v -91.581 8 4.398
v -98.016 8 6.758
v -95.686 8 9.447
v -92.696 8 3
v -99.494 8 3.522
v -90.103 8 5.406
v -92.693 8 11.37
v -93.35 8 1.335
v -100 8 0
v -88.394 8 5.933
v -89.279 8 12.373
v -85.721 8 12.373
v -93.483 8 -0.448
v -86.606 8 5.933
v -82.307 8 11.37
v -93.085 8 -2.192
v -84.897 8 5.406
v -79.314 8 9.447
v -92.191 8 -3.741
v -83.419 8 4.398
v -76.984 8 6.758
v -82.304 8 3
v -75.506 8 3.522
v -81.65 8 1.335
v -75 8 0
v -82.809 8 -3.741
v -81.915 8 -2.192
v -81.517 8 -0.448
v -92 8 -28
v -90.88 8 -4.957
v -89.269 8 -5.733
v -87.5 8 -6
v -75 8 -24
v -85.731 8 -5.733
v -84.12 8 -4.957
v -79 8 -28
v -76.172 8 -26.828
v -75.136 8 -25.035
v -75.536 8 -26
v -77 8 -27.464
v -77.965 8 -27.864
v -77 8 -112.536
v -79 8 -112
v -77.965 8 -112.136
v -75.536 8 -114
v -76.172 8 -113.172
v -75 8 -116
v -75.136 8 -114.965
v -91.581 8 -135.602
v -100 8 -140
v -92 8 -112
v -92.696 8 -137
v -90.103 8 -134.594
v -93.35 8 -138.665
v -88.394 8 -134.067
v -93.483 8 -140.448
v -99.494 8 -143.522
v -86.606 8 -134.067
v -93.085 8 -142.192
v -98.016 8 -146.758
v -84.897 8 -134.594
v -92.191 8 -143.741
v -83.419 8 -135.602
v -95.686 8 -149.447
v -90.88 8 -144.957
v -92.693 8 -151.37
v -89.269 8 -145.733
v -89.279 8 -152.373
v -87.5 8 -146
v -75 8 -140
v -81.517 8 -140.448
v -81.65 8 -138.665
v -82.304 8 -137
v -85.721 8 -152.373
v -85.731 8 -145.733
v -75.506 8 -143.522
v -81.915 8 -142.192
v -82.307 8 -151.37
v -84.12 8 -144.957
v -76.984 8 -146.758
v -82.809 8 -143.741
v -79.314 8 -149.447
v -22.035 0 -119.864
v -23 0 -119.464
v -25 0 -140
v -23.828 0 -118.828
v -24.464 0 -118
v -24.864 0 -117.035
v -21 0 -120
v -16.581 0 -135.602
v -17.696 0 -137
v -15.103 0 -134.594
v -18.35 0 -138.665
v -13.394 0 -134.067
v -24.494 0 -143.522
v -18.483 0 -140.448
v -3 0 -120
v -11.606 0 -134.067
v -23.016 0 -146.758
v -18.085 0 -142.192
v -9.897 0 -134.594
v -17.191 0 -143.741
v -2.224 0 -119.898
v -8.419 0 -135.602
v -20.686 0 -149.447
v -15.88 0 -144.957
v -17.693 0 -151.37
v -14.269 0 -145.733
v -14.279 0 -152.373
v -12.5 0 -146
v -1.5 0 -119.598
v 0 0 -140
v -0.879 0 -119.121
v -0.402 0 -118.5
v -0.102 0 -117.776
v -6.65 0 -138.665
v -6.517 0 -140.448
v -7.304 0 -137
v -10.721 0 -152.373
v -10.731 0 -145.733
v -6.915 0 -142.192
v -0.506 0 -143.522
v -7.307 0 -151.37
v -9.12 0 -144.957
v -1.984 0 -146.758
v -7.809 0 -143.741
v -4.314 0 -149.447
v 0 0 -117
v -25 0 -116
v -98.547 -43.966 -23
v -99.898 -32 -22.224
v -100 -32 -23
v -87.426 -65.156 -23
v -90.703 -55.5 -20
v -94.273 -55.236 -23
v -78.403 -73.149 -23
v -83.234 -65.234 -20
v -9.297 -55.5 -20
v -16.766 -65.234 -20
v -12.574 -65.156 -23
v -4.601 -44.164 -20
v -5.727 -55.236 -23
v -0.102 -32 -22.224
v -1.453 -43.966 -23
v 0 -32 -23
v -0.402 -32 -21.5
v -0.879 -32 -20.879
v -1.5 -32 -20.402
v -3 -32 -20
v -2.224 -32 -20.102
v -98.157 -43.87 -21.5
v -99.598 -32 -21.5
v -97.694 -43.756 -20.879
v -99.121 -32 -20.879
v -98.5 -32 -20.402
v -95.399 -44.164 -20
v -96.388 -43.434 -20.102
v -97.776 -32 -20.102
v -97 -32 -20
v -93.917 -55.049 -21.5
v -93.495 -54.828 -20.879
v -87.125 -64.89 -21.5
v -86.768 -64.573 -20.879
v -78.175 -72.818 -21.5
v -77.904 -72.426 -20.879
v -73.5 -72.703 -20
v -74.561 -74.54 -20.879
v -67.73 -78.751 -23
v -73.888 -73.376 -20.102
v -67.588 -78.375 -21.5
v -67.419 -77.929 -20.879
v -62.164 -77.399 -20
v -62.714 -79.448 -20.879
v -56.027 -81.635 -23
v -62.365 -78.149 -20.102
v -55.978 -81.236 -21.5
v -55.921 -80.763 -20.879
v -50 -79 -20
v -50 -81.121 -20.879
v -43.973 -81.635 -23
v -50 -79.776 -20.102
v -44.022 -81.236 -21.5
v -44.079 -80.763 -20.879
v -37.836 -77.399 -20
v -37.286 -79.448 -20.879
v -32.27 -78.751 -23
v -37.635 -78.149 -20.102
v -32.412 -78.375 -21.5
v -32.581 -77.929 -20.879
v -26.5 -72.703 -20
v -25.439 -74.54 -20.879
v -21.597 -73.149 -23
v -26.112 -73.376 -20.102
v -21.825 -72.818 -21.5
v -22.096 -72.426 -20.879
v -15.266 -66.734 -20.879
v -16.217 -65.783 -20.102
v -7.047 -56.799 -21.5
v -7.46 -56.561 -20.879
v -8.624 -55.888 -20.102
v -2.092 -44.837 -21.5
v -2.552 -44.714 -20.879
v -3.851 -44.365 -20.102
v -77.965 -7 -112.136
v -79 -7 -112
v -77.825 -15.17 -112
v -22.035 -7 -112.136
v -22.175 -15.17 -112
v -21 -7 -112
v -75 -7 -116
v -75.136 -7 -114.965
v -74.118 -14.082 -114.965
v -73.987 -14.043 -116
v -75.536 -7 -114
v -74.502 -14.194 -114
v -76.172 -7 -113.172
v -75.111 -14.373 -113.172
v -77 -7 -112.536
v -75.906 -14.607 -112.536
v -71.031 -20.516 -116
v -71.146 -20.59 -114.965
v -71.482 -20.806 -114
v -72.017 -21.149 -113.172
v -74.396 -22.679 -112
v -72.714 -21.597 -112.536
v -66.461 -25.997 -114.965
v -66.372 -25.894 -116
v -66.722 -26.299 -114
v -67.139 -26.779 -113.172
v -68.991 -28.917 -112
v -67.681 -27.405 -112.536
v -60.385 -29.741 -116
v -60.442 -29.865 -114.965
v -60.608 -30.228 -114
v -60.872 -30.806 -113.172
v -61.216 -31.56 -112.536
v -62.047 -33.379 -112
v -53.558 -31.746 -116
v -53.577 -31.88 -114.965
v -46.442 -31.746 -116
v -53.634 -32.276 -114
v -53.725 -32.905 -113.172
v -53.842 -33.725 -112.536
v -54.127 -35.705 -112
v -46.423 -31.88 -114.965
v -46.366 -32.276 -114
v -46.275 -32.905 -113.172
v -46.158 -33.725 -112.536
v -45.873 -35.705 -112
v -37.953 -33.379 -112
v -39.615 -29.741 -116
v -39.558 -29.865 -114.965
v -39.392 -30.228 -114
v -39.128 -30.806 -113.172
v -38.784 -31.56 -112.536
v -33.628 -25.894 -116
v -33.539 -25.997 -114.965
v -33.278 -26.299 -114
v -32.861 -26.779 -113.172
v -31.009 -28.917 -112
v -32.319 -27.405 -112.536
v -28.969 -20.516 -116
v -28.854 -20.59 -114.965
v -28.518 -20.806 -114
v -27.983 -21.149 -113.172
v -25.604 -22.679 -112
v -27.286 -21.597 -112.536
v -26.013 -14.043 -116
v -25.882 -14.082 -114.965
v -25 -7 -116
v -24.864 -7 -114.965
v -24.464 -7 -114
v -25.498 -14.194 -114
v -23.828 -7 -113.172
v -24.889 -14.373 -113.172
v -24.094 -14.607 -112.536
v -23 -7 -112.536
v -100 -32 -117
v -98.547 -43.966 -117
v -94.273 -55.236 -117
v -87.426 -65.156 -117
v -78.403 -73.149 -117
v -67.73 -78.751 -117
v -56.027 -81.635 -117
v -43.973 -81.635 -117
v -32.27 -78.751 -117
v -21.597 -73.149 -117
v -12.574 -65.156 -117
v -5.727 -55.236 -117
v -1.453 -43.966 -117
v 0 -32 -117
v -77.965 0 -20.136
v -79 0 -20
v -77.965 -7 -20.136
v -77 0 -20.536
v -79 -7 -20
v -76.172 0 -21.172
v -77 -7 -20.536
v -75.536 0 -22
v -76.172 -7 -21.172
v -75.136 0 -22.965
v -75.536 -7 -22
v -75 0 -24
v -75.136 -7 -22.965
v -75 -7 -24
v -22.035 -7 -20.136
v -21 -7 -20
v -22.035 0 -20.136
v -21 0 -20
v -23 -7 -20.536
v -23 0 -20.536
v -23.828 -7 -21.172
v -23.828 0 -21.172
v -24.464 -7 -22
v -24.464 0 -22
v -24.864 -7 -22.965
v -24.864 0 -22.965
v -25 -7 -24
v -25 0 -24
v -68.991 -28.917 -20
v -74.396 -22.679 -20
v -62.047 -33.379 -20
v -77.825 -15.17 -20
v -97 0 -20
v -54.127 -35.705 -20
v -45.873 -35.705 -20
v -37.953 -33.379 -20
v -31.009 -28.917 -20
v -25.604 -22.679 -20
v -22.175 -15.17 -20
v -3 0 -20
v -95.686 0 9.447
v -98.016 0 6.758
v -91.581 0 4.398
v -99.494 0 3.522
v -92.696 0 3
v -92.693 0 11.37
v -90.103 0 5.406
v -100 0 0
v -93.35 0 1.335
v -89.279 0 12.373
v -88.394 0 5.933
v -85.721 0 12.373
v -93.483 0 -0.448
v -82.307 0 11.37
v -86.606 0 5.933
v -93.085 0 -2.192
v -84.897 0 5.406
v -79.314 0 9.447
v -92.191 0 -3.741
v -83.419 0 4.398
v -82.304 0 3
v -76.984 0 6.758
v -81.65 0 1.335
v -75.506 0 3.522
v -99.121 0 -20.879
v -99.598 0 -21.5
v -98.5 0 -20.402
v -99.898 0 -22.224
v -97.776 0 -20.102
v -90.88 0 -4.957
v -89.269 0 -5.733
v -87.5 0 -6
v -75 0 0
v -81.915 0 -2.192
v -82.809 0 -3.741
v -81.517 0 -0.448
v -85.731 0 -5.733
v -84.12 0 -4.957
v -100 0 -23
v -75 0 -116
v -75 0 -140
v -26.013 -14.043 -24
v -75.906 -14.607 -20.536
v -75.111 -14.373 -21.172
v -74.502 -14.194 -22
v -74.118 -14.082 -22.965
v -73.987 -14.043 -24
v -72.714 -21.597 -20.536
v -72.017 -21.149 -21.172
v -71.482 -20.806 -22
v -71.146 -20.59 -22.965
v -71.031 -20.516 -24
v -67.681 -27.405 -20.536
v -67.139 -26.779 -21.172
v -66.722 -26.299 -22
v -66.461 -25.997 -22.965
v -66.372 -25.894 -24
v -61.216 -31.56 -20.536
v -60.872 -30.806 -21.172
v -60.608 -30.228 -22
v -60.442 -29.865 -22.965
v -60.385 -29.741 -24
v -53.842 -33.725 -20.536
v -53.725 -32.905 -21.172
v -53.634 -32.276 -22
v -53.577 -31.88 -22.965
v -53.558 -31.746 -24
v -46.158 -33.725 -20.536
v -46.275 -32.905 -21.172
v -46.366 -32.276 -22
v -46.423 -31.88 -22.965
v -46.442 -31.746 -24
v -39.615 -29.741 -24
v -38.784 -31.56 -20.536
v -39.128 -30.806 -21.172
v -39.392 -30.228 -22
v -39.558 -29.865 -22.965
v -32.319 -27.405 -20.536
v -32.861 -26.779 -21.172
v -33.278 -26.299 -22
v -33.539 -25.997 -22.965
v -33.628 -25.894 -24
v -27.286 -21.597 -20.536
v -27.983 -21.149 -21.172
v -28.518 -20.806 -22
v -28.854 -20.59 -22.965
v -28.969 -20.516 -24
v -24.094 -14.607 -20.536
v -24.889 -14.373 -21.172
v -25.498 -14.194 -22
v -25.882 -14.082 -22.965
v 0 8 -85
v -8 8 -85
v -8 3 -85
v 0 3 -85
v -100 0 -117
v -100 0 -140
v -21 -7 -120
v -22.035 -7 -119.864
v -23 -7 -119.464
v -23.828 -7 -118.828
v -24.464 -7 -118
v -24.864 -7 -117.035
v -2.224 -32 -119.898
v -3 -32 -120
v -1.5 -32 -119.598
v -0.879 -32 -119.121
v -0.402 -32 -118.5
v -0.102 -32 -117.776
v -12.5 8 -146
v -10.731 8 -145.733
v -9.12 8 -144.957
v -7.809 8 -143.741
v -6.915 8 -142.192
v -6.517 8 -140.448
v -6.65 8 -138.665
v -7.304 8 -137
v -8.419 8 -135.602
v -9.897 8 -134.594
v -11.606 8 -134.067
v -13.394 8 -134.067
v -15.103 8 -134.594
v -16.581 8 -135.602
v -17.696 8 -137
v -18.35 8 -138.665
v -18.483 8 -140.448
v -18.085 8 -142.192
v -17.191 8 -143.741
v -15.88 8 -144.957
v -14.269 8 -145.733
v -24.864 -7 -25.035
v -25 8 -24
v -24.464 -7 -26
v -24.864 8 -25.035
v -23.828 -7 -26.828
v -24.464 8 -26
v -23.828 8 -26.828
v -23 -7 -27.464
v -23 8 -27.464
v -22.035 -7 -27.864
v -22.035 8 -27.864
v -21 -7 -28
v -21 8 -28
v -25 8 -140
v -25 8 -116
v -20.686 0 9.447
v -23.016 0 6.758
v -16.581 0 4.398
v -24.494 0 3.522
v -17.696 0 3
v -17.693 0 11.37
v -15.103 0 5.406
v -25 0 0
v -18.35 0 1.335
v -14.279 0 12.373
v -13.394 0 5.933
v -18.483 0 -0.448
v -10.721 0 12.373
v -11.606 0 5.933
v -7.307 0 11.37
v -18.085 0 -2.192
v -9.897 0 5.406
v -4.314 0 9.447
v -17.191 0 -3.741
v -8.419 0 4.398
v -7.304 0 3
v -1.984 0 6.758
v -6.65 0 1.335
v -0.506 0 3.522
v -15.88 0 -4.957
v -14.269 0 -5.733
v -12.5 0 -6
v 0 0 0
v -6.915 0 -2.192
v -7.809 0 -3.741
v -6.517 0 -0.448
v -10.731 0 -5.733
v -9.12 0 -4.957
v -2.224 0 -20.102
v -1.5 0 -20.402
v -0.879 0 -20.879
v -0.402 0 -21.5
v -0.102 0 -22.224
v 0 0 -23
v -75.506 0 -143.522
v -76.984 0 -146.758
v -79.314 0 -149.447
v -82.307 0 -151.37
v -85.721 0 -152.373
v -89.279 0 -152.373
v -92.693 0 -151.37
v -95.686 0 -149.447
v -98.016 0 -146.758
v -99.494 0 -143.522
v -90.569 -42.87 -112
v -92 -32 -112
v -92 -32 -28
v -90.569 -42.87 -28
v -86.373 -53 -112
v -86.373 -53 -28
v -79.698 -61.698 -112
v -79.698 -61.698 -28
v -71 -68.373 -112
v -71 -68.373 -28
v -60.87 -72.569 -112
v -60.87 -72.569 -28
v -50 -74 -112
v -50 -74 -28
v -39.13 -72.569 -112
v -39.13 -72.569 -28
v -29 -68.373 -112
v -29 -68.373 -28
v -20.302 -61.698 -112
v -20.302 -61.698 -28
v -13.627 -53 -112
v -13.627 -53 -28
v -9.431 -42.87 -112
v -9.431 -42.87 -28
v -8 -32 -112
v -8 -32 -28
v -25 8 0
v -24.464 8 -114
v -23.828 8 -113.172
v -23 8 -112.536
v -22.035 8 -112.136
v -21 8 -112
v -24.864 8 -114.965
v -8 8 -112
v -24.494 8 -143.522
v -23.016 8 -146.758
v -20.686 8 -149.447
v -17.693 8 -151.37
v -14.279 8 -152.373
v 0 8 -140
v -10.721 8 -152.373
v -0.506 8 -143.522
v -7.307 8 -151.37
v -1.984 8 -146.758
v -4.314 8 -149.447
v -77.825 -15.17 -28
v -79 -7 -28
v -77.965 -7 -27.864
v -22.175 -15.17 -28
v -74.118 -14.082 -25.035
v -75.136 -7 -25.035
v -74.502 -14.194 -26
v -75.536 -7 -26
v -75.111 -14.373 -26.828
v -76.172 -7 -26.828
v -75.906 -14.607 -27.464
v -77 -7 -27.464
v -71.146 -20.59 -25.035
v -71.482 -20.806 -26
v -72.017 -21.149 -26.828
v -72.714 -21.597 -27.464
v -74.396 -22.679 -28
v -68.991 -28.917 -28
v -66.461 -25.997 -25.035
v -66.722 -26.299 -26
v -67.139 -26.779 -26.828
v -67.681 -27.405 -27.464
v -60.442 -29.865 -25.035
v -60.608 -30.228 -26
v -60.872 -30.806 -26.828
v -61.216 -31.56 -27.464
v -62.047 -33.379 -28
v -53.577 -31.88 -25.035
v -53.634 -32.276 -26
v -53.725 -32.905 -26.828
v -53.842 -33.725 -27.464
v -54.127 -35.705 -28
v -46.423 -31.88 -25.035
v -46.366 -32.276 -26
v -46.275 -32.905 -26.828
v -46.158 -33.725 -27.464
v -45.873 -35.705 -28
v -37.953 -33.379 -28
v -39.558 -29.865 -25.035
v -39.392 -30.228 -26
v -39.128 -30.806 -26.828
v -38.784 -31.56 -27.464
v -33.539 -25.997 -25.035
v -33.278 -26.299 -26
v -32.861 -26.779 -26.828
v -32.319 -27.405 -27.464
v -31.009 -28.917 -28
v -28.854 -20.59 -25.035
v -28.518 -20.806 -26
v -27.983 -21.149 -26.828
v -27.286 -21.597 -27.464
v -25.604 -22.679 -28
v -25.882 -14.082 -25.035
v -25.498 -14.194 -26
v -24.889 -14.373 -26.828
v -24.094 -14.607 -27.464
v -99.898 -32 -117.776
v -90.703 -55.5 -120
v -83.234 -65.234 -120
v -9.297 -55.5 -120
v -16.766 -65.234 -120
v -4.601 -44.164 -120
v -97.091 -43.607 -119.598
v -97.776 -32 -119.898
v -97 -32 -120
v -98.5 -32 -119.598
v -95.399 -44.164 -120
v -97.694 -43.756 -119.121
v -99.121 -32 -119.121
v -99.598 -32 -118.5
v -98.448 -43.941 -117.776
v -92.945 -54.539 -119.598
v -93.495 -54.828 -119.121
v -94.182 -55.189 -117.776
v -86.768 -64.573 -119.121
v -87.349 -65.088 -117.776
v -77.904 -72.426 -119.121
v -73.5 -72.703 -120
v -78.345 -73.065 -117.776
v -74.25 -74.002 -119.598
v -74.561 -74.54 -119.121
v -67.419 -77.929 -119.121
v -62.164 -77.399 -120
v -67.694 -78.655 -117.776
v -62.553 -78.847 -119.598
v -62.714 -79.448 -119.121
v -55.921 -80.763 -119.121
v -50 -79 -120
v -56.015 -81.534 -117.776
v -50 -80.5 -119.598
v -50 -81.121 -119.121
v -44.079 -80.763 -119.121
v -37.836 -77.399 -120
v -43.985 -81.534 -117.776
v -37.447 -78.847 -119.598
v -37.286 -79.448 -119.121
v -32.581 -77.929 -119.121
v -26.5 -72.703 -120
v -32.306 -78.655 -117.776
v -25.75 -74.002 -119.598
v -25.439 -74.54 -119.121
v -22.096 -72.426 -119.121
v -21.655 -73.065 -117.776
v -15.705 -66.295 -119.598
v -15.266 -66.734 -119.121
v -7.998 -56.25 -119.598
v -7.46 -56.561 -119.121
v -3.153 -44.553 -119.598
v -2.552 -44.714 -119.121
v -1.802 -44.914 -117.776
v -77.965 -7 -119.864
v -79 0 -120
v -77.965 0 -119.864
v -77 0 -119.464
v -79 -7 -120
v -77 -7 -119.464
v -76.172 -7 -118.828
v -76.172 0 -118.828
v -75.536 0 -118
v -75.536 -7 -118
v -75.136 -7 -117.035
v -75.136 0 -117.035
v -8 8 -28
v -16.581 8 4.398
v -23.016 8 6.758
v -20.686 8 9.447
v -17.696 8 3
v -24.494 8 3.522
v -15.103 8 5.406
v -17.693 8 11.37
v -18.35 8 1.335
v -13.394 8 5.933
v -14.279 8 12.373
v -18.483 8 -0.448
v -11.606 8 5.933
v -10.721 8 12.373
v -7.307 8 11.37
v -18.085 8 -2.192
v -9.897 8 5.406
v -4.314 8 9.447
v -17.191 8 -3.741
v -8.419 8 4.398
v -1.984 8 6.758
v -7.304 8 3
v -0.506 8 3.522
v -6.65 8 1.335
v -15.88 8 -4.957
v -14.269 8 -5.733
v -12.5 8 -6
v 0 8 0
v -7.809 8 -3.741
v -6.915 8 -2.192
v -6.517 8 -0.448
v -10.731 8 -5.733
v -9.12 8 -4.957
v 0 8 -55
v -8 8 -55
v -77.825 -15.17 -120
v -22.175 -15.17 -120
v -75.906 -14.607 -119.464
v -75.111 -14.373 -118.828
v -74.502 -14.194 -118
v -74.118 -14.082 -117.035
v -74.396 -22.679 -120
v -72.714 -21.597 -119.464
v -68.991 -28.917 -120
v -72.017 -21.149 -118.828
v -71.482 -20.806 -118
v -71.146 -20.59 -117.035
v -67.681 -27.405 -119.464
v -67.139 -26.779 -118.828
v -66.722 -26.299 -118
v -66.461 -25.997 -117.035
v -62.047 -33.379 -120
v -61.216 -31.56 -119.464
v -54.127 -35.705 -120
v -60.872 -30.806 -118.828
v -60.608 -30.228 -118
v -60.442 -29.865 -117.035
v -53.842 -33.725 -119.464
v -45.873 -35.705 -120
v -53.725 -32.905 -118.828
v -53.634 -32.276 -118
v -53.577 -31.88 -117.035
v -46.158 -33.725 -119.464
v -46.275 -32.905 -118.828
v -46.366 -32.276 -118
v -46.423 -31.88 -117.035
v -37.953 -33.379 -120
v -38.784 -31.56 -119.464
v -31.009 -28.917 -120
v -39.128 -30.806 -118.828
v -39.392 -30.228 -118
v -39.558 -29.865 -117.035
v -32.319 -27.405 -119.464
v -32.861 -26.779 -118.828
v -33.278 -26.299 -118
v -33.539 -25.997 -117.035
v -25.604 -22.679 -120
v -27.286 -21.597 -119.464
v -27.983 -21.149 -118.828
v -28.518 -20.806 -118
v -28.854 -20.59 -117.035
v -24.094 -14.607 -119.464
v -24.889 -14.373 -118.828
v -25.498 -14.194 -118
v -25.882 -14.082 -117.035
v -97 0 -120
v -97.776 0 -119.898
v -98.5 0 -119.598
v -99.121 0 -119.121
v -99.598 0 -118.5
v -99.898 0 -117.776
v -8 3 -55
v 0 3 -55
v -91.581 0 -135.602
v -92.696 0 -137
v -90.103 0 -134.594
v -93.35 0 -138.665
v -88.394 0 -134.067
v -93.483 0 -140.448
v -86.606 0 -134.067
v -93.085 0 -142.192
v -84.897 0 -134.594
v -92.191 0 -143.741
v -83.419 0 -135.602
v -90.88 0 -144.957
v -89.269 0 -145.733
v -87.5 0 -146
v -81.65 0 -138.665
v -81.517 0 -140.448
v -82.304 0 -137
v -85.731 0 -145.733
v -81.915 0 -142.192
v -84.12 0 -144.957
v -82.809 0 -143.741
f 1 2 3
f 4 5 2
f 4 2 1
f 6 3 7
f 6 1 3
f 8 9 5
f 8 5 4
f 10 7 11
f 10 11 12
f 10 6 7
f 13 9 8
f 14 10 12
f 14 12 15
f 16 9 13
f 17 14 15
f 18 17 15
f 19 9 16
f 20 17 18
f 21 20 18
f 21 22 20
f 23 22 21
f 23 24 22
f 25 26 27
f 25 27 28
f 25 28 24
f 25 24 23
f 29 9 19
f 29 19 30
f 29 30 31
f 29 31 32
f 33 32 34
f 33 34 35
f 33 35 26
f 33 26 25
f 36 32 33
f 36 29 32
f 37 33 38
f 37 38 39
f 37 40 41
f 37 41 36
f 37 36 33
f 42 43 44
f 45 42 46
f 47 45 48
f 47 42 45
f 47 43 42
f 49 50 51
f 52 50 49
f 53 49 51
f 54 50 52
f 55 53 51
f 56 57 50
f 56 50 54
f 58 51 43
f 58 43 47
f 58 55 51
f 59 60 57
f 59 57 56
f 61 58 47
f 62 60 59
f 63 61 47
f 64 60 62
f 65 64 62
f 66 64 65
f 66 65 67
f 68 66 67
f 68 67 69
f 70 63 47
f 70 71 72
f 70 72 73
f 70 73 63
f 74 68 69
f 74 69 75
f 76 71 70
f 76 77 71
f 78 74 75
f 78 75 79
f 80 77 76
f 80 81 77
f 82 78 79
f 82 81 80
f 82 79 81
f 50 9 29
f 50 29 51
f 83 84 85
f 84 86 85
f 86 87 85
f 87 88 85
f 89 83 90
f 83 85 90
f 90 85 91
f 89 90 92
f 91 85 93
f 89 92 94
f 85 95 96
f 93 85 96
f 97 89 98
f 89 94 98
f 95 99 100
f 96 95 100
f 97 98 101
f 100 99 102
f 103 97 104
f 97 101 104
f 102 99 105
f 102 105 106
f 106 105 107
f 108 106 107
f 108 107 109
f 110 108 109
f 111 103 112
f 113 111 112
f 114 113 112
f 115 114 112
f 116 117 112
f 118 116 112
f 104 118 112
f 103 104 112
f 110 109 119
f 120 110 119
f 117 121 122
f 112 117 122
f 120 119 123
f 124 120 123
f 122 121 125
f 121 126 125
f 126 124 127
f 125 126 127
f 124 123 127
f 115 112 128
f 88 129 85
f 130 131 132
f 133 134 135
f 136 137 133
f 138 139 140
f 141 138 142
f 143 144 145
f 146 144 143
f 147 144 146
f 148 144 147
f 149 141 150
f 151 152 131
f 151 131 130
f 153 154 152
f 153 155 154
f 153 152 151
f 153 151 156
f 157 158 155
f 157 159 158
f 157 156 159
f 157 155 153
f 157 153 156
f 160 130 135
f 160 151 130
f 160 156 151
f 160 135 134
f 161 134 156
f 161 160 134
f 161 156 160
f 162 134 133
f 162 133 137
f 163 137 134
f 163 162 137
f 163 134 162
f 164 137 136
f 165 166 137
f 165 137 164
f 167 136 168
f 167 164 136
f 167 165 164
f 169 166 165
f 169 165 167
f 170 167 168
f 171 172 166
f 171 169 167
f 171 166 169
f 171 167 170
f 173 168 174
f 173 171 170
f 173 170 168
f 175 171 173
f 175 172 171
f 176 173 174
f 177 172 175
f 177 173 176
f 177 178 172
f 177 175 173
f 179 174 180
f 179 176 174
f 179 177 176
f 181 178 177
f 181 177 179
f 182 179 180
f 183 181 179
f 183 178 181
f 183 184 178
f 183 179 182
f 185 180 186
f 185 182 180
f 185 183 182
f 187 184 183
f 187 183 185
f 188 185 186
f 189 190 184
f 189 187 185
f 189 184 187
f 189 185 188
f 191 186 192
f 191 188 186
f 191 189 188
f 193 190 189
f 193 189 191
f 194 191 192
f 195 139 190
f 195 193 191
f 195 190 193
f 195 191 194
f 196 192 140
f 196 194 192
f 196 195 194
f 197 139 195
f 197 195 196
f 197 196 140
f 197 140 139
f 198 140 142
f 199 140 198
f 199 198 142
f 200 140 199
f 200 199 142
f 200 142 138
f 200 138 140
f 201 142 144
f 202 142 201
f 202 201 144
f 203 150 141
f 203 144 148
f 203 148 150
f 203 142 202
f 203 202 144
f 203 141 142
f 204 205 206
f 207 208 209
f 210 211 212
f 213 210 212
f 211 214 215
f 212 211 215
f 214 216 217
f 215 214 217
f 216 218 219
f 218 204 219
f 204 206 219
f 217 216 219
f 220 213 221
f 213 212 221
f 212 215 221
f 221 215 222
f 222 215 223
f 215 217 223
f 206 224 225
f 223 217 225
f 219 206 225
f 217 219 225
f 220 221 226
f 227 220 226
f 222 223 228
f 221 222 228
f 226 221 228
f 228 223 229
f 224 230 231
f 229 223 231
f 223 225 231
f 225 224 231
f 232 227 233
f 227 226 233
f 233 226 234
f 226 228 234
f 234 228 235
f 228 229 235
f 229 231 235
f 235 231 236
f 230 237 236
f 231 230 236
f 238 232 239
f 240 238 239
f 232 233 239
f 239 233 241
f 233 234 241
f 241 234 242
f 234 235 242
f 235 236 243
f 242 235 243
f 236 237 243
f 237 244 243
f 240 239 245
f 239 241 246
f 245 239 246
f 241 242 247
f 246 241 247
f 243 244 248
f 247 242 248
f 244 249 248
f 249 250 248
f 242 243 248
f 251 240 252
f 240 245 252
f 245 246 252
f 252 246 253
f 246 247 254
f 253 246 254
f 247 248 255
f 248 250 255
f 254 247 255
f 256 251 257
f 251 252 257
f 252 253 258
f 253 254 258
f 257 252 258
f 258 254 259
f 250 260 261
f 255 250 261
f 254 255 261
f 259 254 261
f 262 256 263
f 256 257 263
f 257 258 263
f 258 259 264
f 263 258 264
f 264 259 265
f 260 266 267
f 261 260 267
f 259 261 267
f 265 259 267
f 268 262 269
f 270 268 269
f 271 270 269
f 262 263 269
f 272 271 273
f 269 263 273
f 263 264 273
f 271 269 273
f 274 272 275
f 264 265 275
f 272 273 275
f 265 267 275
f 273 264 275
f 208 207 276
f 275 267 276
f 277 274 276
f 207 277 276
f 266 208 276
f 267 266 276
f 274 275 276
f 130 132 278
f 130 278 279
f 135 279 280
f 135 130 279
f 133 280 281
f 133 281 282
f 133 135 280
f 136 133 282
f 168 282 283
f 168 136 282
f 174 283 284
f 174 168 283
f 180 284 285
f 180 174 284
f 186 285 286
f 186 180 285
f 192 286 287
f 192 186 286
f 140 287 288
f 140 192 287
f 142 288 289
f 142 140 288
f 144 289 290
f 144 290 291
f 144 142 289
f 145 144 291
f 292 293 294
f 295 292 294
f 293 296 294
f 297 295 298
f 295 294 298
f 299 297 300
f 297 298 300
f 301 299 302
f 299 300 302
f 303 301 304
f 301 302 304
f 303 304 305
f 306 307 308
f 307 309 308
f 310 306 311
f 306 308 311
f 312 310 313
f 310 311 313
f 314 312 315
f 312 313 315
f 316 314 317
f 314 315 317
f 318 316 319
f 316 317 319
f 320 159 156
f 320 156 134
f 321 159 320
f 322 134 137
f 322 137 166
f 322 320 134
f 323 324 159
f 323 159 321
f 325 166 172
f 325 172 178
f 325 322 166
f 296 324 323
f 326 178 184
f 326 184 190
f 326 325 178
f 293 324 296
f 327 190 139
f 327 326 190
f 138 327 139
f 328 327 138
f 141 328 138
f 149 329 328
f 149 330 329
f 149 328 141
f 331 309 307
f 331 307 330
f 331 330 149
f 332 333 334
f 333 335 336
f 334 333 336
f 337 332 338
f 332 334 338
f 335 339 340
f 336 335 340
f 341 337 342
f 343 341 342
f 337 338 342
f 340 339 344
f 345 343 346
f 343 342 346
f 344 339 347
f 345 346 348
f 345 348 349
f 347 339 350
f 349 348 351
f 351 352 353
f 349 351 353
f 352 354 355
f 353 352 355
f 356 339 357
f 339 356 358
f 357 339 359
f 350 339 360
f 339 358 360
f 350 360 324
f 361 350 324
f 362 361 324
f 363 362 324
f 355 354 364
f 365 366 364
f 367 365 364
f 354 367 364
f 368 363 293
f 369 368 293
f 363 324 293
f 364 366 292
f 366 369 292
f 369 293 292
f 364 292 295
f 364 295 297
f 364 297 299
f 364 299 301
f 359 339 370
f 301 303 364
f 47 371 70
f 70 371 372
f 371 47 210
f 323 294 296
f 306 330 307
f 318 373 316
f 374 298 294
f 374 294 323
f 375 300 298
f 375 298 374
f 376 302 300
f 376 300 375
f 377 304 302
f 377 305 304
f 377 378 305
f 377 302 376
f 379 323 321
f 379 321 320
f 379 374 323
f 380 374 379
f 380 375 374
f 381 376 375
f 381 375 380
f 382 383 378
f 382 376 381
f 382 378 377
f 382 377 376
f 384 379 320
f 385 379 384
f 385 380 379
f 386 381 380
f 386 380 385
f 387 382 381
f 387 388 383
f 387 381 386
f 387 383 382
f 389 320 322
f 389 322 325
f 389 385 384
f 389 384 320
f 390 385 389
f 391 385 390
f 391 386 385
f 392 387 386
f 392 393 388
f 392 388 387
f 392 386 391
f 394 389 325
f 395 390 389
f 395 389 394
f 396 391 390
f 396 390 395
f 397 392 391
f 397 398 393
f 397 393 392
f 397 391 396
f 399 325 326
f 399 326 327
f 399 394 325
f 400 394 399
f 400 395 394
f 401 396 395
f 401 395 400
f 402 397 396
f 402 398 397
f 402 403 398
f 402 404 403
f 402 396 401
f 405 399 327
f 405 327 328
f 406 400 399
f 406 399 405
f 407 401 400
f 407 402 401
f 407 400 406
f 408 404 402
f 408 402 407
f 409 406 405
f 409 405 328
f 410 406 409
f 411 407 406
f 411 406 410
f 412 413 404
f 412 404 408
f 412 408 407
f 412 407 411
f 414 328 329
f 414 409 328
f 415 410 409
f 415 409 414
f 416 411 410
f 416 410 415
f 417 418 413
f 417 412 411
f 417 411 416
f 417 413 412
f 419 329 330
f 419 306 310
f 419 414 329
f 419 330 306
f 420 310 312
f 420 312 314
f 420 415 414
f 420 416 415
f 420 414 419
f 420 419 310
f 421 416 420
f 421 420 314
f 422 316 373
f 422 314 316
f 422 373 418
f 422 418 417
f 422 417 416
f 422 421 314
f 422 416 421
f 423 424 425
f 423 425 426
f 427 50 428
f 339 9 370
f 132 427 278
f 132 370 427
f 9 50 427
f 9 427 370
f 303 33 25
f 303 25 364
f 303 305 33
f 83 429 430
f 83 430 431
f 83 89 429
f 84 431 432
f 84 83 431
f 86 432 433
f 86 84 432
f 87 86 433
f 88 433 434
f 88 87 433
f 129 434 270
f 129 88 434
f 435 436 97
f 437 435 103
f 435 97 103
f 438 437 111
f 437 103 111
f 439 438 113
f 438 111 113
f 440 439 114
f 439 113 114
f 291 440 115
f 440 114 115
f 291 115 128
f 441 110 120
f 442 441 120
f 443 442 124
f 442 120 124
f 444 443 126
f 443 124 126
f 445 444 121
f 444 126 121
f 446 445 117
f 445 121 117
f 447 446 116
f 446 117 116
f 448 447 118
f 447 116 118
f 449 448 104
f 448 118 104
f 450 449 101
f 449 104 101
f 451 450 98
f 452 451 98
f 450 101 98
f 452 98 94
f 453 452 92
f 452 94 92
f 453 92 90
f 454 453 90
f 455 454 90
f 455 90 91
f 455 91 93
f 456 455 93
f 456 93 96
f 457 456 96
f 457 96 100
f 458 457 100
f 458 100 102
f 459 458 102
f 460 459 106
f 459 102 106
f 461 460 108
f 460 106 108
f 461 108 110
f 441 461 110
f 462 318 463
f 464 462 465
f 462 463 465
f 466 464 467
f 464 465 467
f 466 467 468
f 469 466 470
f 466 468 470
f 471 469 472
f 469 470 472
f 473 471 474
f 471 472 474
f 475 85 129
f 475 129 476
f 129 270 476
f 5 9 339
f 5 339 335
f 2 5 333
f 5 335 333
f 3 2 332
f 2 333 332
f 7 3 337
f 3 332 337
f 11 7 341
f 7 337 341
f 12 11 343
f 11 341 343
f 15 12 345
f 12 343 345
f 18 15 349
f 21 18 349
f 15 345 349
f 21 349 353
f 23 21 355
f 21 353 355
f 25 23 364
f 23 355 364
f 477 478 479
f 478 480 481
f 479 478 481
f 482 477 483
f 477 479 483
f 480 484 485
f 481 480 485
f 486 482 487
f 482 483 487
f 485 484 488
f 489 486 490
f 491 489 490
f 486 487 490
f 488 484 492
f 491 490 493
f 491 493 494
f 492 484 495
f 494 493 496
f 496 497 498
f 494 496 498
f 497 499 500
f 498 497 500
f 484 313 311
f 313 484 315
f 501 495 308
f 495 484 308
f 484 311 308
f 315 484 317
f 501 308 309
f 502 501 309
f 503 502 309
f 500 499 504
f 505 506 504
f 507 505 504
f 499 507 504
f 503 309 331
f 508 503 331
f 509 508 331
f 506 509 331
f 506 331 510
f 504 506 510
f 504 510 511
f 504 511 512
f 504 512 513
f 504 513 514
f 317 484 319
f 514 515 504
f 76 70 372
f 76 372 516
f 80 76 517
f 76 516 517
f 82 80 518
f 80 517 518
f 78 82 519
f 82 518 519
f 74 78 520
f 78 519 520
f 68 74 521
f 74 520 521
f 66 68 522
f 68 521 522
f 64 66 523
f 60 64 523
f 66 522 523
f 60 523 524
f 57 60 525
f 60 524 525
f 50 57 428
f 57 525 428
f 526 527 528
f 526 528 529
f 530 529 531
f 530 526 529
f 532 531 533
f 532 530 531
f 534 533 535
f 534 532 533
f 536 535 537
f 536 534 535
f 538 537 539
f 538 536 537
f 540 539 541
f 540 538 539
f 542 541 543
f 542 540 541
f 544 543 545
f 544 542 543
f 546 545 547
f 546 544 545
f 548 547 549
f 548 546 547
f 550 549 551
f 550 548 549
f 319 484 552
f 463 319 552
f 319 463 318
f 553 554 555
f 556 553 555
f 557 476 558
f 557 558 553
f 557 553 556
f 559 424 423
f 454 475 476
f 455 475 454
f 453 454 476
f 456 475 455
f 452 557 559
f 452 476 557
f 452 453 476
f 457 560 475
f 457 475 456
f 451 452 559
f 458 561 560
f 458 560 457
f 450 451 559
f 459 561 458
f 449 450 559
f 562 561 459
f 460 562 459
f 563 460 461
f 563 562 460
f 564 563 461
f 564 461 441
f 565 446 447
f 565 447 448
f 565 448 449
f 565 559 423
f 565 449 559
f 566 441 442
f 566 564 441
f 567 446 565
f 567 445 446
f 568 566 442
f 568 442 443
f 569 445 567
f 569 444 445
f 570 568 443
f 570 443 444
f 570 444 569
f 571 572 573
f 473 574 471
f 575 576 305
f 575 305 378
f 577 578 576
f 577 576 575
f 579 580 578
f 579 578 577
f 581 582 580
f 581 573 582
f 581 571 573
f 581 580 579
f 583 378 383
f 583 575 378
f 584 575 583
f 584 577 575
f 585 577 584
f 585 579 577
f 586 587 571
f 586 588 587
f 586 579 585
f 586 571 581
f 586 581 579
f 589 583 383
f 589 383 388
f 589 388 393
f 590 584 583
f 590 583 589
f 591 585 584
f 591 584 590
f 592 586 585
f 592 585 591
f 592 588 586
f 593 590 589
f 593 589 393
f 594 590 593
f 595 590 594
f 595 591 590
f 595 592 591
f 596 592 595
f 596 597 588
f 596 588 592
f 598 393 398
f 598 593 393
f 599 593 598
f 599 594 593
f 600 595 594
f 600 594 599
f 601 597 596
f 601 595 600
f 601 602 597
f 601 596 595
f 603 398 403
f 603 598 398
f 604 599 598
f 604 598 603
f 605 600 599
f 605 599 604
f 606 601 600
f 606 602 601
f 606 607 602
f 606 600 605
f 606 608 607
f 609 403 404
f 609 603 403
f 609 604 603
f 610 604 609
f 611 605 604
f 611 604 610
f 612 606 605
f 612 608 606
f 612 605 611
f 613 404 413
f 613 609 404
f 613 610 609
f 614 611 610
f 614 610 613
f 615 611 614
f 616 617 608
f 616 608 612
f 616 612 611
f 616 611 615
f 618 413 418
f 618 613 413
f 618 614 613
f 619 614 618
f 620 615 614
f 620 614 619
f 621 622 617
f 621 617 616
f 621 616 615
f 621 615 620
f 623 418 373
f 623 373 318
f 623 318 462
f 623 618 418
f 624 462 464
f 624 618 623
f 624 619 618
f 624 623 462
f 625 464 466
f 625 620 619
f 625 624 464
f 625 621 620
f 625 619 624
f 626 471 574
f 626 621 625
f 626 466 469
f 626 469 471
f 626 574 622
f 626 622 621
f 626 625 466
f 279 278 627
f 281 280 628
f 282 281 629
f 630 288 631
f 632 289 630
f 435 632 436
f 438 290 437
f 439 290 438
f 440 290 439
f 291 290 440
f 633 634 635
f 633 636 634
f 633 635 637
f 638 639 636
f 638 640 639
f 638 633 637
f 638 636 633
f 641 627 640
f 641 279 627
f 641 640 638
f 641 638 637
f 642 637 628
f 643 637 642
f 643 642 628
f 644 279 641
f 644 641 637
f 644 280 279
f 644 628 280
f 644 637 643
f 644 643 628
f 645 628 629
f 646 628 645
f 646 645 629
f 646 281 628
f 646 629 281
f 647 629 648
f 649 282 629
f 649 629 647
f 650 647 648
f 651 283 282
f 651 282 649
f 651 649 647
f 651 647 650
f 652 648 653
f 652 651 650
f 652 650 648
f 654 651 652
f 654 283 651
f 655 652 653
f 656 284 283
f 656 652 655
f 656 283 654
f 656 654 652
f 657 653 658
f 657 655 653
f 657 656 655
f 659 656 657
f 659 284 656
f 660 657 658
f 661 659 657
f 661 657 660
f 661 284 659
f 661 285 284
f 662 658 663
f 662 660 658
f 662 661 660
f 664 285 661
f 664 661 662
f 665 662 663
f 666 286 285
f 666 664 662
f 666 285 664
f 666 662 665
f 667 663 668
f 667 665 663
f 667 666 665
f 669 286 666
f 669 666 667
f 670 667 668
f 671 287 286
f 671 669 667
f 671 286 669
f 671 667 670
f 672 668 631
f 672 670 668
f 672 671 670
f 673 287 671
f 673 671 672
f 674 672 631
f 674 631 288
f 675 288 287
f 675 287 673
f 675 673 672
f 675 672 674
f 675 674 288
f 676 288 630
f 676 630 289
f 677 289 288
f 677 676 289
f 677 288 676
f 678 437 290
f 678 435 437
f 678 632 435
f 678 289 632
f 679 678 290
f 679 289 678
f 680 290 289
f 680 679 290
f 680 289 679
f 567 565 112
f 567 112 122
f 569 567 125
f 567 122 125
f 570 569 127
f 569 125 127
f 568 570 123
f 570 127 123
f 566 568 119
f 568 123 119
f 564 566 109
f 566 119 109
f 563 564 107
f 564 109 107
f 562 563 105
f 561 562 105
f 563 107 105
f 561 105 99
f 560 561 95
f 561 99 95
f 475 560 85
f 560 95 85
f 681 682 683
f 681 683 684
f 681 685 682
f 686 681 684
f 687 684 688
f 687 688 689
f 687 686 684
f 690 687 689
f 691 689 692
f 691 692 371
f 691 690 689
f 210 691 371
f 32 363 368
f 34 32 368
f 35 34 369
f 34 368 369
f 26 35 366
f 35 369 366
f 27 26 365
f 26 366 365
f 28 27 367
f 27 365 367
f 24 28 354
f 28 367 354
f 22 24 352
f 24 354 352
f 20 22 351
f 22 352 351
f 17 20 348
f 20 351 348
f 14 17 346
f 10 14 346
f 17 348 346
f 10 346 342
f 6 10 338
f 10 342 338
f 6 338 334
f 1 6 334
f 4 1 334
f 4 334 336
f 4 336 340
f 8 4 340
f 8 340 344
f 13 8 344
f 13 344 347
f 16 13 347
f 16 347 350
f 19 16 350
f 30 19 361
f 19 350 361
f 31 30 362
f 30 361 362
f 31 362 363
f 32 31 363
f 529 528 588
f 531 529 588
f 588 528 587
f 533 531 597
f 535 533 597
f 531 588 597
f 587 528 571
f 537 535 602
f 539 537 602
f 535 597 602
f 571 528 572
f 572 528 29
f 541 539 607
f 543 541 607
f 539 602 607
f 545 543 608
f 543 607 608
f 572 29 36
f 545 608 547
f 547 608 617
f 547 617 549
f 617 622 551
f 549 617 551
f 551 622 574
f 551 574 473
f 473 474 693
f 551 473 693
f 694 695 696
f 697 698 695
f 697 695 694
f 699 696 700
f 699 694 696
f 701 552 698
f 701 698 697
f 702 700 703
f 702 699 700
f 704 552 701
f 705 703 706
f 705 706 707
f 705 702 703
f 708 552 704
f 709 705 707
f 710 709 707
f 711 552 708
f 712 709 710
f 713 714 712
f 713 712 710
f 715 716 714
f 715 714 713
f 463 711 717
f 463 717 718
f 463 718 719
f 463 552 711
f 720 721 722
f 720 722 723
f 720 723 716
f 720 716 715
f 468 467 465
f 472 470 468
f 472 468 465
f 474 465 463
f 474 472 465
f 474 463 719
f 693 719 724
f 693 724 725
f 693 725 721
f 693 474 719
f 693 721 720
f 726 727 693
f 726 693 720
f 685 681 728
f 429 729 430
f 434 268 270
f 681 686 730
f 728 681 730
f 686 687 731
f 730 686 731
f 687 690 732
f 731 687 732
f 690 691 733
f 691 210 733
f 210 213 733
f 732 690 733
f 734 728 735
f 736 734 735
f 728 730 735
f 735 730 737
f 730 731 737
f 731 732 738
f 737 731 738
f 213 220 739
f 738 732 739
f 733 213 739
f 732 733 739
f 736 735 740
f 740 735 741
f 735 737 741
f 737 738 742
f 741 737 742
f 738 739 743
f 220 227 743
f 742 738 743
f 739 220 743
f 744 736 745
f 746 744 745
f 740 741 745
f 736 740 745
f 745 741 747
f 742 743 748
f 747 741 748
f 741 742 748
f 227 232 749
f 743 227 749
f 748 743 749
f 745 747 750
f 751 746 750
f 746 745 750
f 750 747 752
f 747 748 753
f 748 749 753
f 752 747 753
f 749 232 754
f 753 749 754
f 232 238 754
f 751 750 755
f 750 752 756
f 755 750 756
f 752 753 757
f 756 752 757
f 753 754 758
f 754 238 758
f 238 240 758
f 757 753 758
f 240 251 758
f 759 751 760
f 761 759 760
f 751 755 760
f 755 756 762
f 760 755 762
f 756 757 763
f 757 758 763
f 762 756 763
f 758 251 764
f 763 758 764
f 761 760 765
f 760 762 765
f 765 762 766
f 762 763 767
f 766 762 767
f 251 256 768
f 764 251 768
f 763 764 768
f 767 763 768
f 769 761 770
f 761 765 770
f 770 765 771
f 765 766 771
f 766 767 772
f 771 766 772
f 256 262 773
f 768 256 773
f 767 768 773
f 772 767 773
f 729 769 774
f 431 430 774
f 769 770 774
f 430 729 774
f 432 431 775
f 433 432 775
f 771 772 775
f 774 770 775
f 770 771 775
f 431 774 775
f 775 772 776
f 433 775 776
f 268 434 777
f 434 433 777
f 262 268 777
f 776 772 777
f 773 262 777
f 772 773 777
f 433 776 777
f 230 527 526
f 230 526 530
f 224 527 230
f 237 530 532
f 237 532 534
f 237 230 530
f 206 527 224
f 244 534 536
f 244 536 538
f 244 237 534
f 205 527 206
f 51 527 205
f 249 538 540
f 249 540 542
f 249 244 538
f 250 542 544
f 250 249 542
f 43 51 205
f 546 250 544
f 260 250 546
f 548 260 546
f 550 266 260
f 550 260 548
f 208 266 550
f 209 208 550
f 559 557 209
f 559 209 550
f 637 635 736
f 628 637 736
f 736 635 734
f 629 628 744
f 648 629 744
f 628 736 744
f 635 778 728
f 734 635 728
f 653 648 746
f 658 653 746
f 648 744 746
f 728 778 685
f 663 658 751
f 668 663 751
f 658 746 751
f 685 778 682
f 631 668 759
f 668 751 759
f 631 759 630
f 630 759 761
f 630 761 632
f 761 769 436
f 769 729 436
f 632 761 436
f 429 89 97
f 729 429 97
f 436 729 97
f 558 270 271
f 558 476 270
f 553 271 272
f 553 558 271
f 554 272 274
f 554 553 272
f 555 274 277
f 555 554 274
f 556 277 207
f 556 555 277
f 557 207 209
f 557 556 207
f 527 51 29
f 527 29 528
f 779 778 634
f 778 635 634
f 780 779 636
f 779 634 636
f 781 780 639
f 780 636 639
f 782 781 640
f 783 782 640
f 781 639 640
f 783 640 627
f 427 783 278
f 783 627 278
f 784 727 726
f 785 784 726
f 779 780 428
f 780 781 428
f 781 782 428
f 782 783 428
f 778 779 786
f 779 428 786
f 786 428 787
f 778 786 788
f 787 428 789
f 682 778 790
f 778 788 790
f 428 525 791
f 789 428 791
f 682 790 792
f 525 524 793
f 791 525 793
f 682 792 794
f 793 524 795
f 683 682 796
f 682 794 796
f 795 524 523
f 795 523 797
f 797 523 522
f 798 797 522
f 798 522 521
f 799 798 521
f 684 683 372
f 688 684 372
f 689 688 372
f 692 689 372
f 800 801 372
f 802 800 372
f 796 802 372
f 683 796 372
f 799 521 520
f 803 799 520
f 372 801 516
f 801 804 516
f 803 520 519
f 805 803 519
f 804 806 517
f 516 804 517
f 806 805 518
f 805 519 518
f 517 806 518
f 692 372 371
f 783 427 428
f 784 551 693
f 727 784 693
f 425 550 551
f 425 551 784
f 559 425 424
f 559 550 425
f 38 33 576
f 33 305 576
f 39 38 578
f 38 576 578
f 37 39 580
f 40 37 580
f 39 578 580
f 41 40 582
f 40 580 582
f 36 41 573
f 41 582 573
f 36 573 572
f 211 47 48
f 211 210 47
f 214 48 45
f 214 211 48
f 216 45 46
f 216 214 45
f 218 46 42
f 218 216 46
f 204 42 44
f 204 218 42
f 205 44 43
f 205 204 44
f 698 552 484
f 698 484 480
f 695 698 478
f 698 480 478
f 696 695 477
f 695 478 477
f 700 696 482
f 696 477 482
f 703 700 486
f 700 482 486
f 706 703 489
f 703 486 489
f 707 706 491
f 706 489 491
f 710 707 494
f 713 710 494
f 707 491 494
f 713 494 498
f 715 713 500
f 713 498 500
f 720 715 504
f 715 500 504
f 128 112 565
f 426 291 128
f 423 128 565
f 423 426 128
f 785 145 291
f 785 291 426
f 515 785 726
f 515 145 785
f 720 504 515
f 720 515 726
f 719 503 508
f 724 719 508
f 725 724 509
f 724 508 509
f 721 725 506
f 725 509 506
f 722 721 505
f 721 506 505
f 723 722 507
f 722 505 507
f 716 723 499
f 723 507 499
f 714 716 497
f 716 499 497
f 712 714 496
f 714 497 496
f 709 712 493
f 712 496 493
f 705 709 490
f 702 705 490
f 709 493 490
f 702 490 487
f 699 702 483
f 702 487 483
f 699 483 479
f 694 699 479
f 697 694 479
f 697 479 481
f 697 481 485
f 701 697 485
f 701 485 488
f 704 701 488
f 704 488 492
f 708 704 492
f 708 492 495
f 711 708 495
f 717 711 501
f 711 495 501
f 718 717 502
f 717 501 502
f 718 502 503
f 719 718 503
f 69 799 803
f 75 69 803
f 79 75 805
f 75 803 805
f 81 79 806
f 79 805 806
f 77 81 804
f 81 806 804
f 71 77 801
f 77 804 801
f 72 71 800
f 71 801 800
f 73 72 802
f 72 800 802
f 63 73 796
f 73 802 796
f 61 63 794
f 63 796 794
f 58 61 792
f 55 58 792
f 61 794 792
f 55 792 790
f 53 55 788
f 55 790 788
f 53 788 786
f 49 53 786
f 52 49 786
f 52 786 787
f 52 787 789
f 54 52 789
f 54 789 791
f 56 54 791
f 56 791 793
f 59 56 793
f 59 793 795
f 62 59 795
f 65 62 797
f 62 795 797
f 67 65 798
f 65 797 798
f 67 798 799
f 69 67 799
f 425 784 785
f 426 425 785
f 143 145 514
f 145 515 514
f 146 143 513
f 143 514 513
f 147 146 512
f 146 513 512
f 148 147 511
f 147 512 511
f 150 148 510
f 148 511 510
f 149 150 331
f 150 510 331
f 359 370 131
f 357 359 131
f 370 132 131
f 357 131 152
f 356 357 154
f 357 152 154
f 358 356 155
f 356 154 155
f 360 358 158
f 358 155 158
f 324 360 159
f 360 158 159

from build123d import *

# Parameters (mm, degrees)
BASE_DEPTH              = 8
CROQUIS5_R              = 6
PERFORACIONES_DEPTH     = 8
SALIENTE_EXTRUIR5_DEPTH = 100
VACIADO2_START          = -112
VACIADO2_DEPTH          = 84
CORTAR_EXTRUIR3_DEPTH   = 100
CROQUIS10_W             = 8
CROQUIS10_H             = 30
CORTAR_EXTRUIR4_DEPTH   = 5
REDONDEO1_R             = 4
REDONDEO2_R             = 4
REDONDEO3_R             = 3


# Read off the part's stored shape, not the designer's step: Vaciado2
with BuildPart() as part:
    # Croquis4 → Base (new body)
    with BuildSketch(Plane(origin=(0, 0, 0), x_dir=(1, 0, 0), z_dir=(0, 1, 0))):
        with BuildLine():
            Line((0, 0), (0, 140))
            ThreePointArc((0, 140), (-12.5, 152.5), (-25, 140))
            Line((-25, 140), (-25, 120))
            Line((-25, 120), (-75, 120))
            Line((-75, 120), (-75, 140))
            ThreePointArc((-75, 140), (-87.5, 152.5), (-100, 140))
            Line((-100, 140), (-100, 0))
            ThreePointArc((-100, 0), (-87.5, -12.5), (-75, 0))
            Line((-75, 0), (-75, 20))
            Line((-75, 20), (-25, 20))
            Line((-25, 20), (-25, 0))
            ThreePointArc((-25, 0), (-12.5, -12.5), (0, 0))
        make_face()
    extrude(amount=BASE_DEPTH)

    # Croquis5 → Perforaciones (cut)
    with BuildSketch(Plane.XZ):
        with Locations(Location((-87.5, 0, 0), (0, 0, 270))):
            Circle(CROQUIS5_R)
        with Locations(Location((-12.5, 0, 0), (0, 0, 270))):
            Circle(CROQUIS5_R)
        with Locations(Location((-87.5, -140, 0), (0, 0, 270))):
            Circle(CROQUIS5_R)
        with Locations(Location((-12.5, -140, 0), (0, 0, 270))):
            Circle(CROQUIS5_R)
    extrude(amount=-PERFORACIONES_DEPTH, mode=Mode.SUBTRACT)

    # Croquis7 → Saliente-Extruir5 (add)
    with BuildSketch(Plane.XY.offset(-20)):
        with BuildLine():
            Line((-100, 0), (-100, -32))
            ThreePointArc((-100, -32), (-50, -82), (0, -32))
            Line((0, -32), (0, 0))
            Line((0, 0), (-100, 0))
        make_face()
    extrude(amount=-SALIENTE_EXTRUIR5_DEPTH)

    # Vaciado2 outline → Vaciado2 (cut)
    with BuildSketch(Plane.XY.offset(VACIADO2_START)):
        with BuildLine():
            Line((-8, -32), (-8, 8))
            Line((-8, 8), (-92, 8))
            Line((-92, 8), (-92, -32))
            ThreePointArc((-92, -32), (-50, -74), (-8, -32))
        make_face()
    extrude(amount=VACIADO2_DEPTH, mode=Mode.SUBTRACT)

    # Croquis9 → Cortar-Extruir3 (cut)
    with BuildSketch(Plane.XY.offset(-20)):
        with BuildLine():
            Line((-75, 8), (-75, -7))
            ThreePointArc((-75, -7), (-50, -32), (-25, -7))
            Line((-25, -7), (-25, 8))
            Line((-25, 8), (-75, 8))
        make_face()
    extrude(amount=-CORTAR_EXTRUIR3_DEPTH, mode=Mode.SUBTRACT)

    # Croquis10 → Cortar-Extruir4 (cut)
    with BuildSketch(Plane(origin=(0, 8, 0), x_dir=(1, 0, 0), z_dir=(0, 1, 0))):
        with Locations((-4, 70)):
            Rectangle(CROQUIS10_W, CROQUIS10_H)
    extrude(amount=-CORTAR_EXTRUIR4_DEPTH, mode=Mode.SUBTRACT)

    # Redondeo1
    redondeo1_edges = [part.edges().sort_by_distance(p)[0] for p in [
        (-75, 0.5, -28),
        (-50, -32, -28),
        (-25, 0.5, -28),
        (-75, -3.5, -20),
        (-25, -3.5, -20),
    ]]
    fillet(redondeo1_edges, radius=REDONDEO1_R - 0.0001)  # a hair under: the kernel refuses the full size

    # Redondeo2
    redondeo2_edges = [part.edges().sort_by_distance(p)[0] for p in [
        (-25, 0.5, -112),
        (-25, -3.5, -120),
        (-50, -32, -112),
        (-75, 0.5, -112),
        (-75, -3.5, -120),
    ]]
    fillet(redondeo2_edges, radius=REDONDEO2_R - 0.0001)  # a hair under: the kernel refuses the full size

    # Redondeo3
    redondeo3_edges = [part.edges().sort_by_distance(p)[0] for p in [
        (0, -16, -120),
        (-50, -82, -120),
        (-100, -16, -120),
        (-100, -16, -20),
        (-50, -82, -20),
        (0, -16, -20),
    ]]
    fillet(redondeo3_edges, radius=REDONDEO3_R)


solid = part.part
